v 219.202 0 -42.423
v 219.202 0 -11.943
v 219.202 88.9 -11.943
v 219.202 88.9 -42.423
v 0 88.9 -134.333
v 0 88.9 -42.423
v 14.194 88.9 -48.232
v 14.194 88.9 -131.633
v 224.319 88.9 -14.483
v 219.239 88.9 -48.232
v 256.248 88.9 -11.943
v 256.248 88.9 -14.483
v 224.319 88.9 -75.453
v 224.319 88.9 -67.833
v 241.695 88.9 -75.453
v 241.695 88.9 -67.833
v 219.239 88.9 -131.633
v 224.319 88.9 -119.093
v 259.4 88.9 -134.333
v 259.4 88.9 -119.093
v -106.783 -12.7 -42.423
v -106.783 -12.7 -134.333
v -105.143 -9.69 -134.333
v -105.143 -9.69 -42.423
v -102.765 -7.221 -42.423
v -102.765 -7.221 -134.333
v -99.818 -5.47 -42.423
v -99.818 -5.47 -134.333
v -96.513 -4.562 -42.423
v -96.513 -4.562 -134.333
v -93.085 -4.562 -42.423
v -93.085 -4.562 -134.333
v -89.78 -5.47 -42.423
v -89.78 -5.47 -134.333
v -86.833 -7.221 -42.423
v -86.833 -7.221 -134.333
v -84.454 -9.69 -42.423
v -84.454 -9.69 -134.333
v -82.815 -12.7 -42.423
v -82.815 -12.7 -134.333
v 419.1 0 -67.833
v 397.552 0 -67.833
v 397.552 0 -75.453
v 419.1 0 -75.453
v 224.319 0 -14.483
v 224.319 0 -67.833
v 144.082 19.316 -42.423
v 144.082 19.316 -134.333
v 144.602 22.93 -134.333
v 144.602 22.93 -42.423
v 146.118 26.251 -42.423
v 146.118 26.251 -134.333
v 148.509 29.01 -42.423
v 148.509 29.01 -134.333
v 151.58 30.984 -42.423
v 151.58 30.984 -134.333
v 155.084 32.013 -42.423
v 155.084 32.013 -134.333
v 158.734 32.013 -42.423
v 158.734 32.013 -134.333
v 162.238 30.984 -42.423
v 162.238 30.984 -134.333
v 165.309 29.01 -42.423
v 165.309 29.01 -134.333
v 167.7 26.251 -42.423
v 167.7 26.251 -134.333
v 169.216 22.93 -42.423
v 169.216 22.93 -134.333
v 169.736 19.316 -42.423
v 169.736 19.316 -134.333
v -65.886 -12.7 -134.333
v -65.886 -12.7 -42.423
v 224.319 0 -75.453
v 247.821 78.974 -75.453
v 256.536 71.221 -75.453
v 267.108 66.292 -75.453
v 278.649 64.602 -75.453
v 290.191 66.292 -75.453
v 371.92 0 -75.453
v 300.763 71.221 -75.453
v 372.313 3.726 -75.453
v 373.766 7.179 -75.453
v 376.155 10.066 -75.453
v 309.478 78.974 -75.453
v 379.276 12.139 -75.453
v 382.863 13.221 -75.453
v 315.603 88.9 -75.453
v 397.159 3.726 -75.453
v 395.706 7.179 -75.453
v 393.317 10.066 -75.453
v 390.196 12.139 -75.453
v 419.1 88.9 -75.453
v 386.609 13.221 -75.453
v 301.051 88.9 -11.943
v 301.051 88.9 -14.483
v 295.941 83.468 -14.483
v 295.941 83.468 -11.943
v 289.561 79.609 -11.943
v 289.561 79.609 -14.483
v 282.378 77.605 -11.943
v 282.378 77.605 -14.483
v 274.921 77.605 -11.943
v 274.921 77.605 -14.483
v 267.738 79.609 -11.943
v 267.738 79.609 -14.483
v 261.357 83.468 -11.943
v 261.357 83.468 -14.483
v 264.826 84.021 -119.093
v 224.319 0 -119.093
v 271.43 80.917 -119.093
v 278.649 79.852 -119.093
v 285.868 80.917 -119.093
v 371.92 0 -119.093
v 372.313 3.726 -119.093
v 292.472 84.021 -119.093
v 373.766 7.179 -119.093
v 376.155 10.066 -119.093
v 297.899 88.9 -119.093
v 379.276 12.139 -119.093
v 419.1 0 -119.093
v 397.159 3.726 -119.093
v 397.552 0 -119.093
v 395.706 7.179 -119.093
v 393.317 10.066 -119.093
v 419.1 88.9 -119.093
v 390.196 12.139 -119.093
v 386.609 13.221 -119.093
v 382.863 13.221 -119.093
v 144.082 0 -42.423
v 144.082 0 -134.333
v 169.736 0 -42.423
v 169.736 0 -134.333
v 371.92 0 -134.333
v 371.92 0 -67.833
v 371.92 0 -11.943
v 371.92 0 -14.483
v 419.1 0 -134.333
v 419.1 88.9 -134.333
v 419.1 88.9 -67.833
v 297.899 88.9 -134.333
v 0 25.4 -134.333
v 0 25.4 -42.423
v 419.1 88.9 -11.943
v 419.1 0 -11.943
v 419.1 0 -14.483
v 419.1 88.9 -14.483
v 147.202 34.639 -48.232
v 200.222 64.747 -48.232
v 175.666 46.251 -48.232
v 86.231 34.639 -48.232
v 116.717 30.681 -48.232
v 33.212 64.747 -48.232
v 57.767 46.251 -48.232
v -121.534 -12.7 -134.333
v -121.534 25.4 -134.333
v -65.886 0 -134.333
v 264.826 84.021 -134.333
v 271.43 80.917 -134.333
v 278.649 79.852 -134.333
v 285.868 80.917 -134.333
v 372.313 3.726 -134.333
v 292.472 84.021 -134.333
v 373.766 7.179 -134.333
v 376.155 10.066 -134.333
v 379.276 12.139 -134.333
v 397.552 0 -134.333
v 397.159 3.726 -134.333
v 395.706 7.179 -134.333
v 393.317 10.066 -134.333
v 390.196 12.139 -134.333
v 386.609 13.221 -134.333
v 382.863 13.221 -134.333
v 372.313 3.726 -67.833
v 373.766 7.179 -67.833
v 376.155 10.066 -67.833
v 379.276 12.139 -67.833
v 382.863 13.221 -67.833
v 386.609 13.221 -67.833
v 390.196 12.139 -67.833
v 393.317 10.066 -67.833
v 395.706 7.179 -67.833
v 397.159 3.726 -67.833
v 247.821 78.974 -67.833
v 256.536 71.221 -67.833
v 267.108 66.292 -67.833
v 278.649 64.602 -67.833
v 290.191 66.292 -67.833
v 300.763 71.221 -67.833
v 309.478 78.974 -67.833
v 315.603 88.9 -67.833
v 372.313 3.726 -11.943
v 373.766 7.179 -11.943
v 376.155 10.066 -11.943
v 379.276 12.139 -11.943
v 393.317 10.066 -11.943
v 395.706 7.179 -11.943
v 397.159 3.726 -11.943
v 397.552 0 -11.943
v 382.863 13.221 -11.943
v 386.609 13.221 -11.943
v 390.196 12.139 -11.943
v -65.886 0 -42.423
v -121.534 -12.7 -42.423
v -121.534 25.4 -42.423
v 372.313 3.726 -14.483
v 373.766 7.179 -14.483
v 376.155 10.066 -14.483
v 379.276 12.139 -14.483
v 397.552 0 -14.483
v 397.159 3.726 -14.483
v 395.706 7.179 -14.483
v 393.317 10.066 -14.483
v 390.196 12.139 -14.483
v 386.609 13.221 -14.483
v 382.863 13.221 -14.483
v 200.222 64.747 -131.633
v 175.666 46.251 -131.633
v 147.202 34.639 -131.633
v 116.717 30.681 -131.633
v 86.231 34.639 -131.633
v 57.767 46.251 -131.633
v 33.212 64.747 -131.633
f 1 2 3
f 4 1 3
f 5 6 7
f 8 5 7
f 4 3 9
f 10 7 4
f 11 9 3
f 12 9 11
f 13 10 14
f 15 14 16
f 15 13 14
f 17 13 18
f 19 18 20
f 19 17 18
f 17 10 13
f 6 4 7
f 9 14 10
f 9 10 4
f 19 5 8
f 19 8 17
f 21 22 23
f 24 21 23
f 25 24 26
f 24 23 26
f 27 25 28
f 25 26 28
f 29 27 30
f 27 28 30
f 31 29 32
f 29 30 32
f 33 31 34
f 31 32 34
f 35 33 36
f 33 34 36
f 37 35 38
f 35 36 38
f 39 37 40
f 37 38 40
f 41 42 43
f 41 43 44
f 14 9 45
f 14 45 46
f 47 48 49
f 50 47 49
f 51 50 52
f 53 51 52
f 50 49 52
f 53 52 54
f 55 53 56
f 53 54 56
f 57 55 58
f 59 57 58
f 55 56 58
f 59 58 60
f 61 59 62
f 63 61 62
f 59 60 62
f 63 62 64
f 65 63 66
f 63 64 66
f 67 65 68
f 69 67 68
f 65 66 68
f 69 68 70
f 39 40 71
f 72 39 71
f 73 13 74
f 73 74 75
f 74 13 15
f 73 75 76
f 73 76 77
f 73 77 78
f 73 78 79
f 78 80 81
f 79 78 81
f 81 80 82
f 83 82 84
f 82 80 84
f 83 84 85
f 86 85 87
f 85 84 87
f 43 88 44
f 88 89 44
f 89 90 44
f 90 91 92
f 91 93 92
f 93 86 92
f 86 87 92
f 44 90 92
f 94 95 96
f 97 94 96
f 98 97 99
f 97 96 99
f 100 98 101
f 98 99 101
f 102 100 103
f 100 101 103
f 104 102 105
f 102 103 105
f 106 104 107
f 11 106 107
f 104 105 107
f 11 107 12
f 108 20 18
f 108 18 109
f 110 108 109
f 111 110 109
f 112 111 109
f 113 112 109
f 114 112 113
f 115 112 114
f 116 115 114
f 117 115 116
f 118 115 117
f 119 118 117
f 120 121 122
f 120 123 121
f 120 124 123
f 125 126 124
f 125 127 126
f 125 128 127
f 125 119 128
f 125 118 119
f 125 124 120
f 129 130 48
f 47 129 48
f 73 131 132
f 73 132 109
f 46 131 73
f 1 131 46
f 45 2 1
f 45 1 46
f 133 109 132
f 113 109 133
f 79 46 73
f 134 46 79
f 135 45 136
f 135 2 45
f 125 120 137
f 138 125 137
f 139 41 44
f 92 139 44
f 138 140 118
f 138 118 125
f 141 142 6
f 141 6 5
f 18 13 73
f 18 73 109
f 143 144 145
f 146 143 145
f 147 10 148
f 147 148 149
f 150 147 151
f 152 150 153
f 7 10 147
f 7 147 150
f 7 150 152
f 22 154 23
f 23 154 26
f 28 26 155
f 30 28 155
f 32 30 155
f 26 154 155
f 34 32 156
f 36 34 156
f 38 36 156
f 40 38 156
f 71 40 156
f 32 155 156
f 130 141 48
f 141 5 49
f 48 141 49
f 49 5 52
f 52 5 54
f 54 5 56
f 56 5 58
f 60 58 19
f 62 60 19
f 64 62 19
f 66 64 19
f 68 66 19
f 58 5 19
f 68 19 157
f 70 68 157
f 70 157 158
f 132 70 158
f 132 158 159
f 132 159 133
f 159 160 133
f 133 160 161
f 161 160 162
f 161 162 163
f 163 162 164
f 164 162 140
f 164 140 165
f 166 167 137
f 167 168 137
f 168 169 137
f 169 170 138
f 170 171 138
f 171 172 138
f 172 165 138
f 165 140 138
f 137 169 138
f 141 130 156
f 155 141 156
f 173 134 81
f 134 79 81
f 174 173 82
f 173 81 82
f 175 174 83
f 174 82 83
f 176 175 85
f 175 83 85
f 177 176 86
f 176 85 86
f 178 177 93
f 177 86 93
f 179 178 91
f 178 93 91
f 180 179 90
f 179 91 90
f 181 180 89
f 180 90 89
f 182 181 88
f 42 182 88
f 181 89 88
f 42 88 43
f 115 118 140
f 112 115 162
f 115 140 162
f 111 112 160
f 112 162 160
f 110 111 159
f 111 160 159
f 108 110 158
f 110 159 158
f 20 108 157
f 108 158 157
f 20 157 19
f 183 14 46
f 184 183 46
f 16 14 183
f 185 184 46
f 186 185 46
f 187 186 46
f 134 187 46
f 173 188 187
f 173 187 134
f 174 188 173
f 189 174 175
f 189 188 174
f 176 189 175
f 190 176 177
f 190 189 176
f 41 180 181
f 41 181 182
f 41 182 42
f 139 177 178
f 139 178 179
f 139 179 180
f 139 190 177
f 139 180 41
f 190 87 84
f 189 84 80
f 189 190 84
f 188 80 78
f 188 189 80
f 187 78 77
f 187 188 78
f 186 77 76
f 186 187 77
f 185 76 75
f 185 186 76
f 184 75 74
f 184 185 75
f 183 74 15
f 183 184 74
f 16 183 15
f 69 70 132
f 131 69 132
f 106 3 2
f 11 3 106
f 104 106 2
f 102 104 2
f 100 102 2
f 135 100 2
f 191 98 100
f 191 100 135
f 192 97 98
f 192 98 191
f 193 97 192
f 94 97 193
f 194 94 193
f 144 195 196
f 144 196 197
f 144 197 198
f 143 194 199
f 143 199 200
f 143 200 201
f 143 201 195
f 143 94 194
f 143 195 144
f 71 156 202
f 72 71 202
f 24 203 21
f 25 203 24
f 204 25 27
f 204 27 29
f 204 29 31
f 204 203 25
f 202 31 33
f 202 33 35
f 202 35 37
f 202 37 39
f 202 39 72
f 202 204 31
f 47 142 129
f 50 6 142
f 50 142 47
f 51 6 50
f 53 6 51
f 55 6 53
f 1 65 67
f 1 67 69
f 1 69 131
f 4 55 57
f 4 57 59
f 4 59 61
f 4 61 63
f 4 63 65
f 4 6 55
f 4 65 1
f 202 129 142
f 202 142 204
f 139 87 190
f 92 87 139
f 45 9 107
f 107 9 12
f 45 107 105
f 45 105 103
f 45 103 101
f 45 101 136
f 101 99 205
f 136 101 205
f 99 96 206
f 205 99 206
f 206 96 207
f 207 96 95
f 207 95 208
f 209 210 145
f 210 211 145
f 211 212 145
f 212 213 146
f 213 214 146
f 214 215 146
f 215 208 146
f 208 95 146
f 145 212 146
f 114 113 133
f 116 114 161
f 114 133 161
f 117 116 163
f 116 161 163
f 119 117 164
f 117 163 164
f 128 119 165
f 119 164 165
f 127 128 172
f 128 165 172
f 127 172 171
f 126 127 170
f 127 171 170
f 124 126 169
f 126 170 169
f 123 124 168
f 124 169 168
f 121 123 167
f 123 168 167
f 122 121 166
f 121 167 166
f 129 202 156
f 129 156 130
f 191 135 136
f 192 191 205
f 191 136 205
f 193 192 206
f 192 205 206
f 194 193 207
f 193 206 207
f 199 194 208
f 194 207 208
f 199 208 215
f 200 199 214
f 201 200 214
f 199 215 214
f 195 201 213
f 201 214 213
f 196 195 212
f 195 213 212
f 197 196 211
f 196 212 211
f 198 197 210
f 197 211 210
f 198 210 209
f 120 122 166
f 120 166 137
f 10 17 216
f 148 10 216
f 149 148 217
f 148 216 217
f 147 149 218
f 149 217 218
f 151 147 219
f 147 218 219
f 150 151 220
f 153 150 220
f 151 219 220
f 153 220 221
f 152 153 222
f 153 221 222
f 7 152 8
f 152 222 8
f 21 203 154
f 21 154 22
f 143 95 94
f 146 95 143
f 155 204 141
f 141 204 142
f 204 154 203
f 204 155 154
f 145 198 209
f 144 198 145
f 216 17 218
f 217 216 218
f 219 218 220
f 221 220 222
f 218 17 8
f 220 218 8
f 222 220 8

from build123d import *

# Parameters (mm, degrees)
SKETCH1_W           = 419.1
SKETCH1_H           = 142.18412
BOSS_EXTRUDE1_DEPTH = 88.9
SKETCH2_R           = 119.38
CUT_EXTRUDE1_DEPTH  = 83.4009
SKETCH7_W           = 194.780719179
SKETCH7_H           = 43.63974
SKETCH7_H_2         = 53.35016
CUT_EXTRUDE2_DEPTH  = 452.402640644
SKETCH3_R           = 24.99995
CUT_EXTRUDE3_DEPTH  = 15.24
SKETCH4_R           = 40.25011
CUT_EXTRUDE4_DEPTH  = 10
SKETCH5_R           = 27.50058
CUT_EXTRUDE5_DEPTH  = 2.54
SKETCH8_W           = 419.1
SKETCH8_H           = 88.9
CUT_EXTRUDE6_DEPTH  = 7.85114
SKETCH9_W           = 419.1
SKETCH9_H           = 88.9
CUT_EXTRUDE7_DEPTH  = 11.94308
SKETCH10_W          = 219.202
SKETCH10_H          = 88.9
CUT_EXTRUDE8_DEPTH  = 30.48
SKETCH12_W          = 121.533574186
SKETCH12_H          = 91.9099
BOSS_EXTRUDE2_DEPTH = 25.4
SKETCH14_W          = 55.647095764
SKETCH14_H          = 91.9099
BOSS_EXTRUDE3_DEPTH = 12.7
SKETCH17_R          = 12.827
CUT_EXTRUDE10_DEPTH = 446.564033133


with BuildPart() as part:
    # Sketch1 → Boss-Extrude1 (new body)
    with BuildSketch(Plane(origin=(0, 0, 0), x_dir=(1, 0, 0), z_dir=(0, 1, 0))):
        with Locations((209.55, 71.09206)):
            Rectangle(SKETCH1_W, SKETCH1_H)
    extrude(amount=BOSS_EXTRUDE1_DEPTH)

    # Sketch2 → Cut-Extrude1 (cut)
    with BuildSketch(Plane(origin=(0, 0, -131.63296), x_dir=(-1, 0, 0), z_dir=(0, 0, -1))):
        with Locations((-116.7166499, 150.061217688)):
            Circle(SKETCH2_R)
    extrude(amount=-CUT_EXTRUDE1_DEPTH, mode=Mode.SUBTRACT)

    # Sketch7 → Cut-Extrude2 (cut, through all)
    with BuildSketch(Plane(origin=(0, 88.9, 0), x_dir=(1, 0, 0), z_dir=(0, 1, 0))):
        with Locations((321.709640411, 97.27311)):
            Rectangle(SKETCH7_W, SKETCH7_H)
        with Locations((321.709640411, 41.15816)):
            Rectangle(SKETCH7_W, SKETCH7_H_2)
    extrude(amount=-CUT_EXTRUDE2_DEPTH, mode=Mode.SUBTRACT)

    # Sketch3 → Cut-Extrude3 (cut)
    with BuildSketch(Plane(origin=(0, 0, -134.33298), x_dir=(-1, 0, 0), z_dir=(0, 0, -1))):
        with Locations((-278.649352085, 104.852009966)):
            Circle(SKETCH3_R)
    extrude(amount=-CUT_EXTRUDE3_DEPTH, mode=Mode.SUBTRACT)

    # Sketch4 → Cut-Extrude4 (cut)
    with BuildSketch(Plane(origin=(0, 0, -67.83324), x_dir=(-1, 0, 0), z_dir=(0, 0, -1))):
        with Locations((-278.649352085, 104.852009966)):
            Circle(SKETCH4_R)
    extrude(amount=CUT_EXTRUDE4_DEPTH, mode=Mode.SUBTRACT)

    # Sketch5 → Cut-Extrude5 (cut)
    with BuildSketch(Plane(origin=(0, 0, -14.48308), x_dir=(-1, 0, 0), z_dir=(0, 0, -1))):
        with Locations((-278.649352085, 104.852009966)):
            Circle(SKETCH5_R)
    extrude(amount=-CUT_EXTRUDE5_DEPTH, mode=Mode.SUBTRACT)

    # Sketch8 → Cut-Extrude6 (cut)
    with BuildSketch(Plane(origin=(0, 0, -142.18412), x_dir=(-1, 0, 0), z_dir=(0, 0, -1))):
        with Locations((-209.55, 44.45)):
            Rectangle(SKETCH8_W, SKETCH8_H)
    extrude(amount=-CUT_EXTRUDE6_DEPTH, mode=Mode.SUBTRACT)

    # Sketch9 → Cut-Extrude7 (cut)
    with BuildSketch(Plane.XY):
        with Locations((209.55, 44.45)):
            Rectangle(SKETCH9_W, SKETCH9_H)
    extrude(amount=-CUT_EXTRUDE7_DEPTH, mode=Mode.SUBTRACT)

    # Sketch10 → Cut-Extrude8 (cut)
    with BuildSketch(Plane.XY.offset(-11.94308)):
        with Locations((109.601, 44.45)):
            Rectangle(SKETCH10_W, SKETCH10_H)
    extrude(amount=-CUT_EXTRUDE8_DEPTH, mode=Mode.SUBTRACT)

    # Sketch12 → Boss-Extrude2 (add)
    with BuildSketch(Plane.XZ):
        with Locations((-60.766787093, -88.37803)):
            Rectangle(SKETCH12_W, SKETCH12_H)
    extrude(amount=-BOSS_EXTRUDE2_DEPTH)

    # Sketch14 → Boss-Extrude3 (add)
    with BuildSketch(Plane.XZ):
        with Locations((-93.710026304, -88.37803)):
            Rectangle(SKETCH14_W, SKETCH14_H)
    extrude(amount=BOSS_EXTRUDE3_DEPTH)

    # Sketch17 → Cut-Extrude10 (cut, through all)
    with BuildSketch(Plane(origin=(0, 0, -134.33298), x_dir=(-1, 0, 0), z_dir=(0, 0, -1))):
        with Locations((-384.735935495, 0.531880938)):
            Circle(SKETCH17_R)
        with Locations((94.798916194, -17.274045482)):
            Circle(SKETCH17_R)
        with BuildLine():
            Line((-169.736021607, 19.31637742), (-169.736021607, 0))
            Line((-169.736021607, 0), (-144.082021607, 0))
            Line((-144.082021607, 0), (-144.082021607, 19.31637742))
            ThreePointArc((-144.082021607, 19.31637742), (-156.909021607, 32.14337742), (-169.736021607, 19.31637742))
        make_face()
    extrude(amount=-CUT_EXTRUDE10_DEPTH, mode=Mode.SUBTRACT)


solid = part.part
